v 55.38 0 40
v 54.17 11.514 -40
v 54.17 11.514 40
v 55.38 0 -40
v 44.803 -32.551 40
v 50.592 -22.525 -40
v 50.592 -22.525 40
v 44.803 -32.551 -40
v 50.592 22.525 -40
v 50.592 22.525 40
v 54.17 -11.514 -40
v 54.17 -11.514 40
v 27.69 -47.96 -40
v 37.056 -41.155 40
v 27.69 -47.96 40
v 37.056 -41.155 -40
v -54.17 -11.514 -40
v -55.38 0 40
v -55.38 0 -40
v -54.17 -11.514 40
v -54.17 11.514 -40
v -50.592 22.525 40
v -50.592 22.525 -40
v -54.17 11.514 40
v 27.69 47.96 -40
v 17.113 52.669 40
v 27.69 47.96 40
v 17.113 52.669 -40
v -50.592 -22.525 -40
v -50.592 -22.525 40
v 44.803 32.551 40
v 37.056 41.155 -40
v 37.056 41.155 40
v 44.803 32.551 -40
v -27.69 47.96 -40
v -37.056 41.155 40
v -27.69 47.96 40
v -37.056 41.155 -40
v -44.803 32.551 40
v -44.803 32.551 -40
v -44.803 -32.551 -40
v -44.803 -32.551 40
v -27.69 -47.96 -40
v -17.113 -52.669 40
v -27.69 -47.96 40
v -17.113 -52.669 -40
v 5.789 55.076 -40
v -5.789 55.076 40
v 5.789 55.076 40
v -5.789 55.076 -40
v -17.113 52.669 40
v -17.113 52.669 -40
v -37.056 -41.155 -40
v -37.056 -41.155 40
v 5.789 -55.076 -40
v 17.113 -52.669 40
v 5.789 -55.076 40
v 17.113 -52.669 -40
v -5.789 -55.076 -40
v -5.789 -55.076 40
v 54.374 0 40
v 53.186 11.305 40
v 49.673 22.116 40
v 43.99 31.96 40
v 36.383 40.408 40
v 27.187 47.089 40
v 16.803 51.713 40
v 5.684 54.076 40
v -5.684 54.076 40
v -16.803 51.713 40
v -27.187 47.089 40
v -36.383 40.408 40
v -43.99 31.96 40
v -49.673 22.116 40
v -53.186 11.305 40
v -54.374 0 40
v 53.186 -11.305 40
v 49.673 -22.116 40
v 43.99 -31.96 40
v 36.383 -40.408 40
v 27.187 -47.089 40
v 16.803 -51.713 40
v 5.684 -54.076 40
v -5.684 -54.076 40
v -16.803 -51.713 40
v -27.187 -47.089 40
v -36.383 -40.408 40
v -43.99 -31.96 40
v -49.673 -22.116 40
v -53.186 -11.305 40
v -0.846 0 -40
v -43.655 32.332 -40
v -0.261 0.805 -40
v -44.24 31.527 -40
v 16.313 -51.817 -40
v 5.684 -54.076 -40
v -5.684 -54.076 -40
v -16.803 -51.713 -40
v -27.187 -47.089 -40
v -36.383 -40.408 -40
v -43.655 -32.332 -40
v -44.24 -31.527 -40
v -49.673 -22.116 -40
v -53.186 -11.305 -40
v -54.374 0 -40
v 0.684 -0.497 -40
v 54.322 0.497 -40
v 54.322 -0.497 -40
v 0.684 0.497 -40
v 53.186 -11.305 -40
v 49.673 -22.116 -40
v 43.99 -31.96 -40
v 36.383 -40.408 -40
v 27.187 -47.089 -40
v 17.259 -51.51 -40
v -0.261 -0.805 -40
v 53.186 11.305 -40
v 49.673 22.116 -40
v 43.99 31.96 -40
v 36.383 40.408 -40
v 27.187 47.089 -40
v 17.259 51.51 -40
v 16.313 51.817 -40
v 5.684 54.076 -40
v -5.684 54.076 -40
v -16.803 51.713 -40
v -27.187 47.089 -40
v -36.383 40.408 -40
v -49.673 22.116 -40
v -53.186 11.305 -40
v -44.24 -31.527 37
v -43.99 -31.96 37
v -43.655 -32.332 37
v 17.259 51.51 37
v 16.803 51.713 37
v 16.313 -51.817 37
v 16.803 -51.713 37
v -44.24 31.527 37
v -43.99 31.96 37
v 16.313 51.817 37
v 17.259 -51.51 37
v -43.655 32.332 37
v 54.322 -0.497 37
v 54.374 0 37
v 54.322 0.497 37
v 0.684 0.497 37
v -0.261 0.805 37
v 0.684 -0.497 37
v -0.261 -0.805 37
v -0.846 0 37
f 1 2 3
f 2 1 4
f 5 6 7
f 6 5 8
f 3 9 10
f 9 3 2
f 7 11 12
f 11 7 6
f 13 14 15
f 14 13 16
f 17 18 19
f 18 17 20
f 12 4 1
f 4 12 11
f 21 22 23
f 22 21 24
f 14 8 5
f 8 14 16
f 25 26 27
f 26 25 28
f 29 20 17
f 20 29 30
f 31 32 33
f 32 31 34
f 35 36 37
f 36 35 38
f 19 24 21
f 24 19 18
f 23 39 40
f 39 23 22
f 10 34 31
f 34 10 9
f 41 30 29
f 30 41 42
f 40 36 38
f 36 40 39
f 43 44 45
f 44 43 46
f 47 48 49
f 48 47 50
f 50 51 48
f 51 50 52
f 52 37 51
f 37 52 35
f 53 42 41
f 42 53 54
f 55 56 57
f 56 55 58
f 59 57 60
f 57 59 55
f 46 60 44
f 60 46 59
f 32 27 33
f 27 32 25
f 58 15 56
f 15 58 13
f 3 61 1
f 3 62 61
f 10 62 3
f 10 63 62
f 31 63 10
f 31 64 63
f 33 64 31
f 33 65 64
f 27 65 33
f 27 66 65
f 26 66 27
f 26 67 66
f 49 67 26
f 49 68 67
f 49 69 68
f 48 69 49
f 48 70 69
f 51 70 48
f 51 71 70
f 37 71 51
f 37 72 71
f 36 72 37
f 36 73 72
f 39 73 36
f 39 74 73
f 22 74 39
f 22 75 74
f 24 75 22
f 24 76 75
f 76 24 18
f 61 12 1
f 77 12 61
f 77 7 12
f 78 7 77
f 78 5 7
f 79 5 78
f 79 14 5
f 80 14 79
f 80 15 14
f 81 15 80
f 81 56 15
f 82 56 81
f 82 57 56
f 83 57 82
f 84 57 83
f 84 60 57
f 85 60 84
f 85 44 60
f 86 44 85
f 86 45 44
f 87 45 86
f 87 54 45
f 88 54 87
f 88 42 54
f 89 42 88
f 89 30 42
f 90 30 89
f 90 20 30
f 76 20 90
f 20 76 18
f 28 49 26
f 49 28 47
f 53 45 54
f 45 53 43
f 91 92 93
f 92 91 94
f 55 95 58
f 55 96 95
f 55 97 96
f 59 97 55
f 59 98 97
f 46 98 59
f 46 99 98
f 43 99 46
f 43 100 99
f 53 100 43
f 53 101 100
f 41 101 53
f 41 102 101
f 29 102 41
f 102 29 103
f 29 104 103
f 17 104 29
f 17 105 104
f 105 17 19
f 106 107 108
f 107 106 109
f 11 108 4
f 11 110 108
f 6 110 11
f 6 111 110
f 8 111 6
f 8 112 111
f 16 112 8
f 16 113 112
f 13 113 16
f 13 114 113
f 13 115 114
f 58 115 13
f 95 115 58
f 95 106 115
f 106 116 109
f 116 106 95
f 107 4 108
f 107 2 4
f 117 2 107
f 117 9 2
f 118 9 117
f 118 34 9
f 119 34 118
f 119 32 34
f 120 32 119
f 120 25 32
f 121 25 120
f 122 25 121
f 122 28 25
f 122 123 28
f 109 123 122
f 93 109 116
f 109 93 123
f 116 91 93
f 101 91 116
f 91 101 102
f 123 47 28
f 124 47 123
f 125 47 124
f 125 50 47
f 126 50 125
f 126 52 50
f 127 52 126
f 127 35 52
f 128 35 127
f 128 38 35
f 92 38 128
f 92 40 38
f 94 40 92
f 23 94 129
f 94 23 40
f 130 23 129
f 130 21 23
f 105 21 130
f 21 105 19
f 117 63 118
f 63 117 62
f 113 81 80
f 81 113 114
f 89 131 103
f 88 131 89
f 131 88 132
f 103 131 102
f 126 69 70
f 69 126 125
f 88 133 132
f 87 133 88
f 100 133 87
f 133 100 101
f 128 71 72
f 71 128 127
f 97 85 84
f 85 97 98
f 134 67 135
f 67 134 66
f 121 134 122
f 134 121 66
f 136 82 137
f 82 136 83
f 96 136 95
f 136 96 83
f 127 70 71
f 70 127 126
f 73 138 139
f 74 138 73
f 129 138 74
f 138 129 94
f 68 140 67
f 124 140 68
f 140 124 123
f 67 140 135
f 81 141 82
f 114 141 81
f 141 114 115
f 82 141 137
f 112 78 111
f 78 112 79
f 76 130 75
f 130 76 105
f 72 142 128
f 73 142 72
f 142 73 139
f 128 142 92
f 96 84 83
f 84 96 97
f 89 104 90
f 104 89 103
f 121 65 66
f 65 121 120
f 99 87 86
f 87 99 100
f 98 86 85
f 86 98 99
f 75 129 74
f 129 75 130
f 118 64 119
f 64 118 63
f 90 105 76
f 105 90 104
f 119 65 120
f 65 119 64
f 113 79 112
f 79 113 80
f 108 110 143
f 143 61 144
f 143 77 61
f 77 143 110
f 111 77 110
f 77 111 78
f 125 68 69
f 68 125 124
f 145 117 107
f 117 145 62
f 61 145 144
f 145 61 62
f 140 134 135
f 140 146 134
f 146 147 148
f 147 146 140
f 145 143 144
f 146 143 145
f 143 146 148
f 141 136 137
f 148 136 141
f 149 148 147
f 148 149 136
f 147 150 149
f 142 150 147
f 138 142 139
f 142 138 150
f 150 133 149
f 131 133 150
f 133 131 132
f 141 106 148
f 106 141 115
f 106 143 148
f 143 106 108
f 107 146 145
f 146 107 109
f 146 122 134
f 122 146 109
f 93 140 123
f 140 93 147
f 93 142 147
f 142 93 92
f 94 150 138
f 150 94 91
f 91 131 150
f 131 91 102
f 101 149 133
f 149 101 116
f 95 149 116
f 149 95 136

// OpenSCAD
$fn=30;
 {
    h=80;
color((rndc()+[1,1,1])/2) 
 rotate(rndR()*0.0 )translate([0,0,-h/2])makecup(
h,
pip=rnd(.1,.9),
pipr=rnd(0.25,.0),
dia=70*5/3.16,
div=5,
wall=1);
}

module makecup(
h=50,
pip=.6,
pipr=.5,
dia=40,
div=5,
wall=1){

difference()
{

 connect(h,pip,pipr,dia,div,wall){
translate([0,0,h-wall])linear_extrude(wall)top( h,pip,pipr,dia,div,wall);
translate([0,0,h*(1-pip)-wall])linear_extrude(wall)bottom(h,pip,pipr,dia,div,wall);
linear_extrude(wall)bottom(h,pip,pipr,dia,div,wall);
 }
 
difference(){
 connect(h,pip,pipr,dia,div,wall){
translate([0,0,h-wall+0.01])linear_extrude(wall)offset(-wall)top(h,pip,pipr,dia,div,wall);
translate([0,0,h*(1-pip)-wall])linear_extrude(wall)offset(-wall)bottom(h,pip,pipr,dia,div,wall);
translate([0,0,-0.01]) linear_extrude(wall)offset(-wall)bottom(h,pip,pipr,dia,div,wall);
 }
  l=0.9;
linear_extrude(h-wall*3,convexity=100) {

 for (x=[0:360/(div
     ):360]){
rotate (x) hull()
 {
     
  circle(wall/2);
 
     translate([((dia/2)),0,0]) 
  circle(wall/2);
 }
  
 
 }}
}

} 
}
module connect(h,pip,pipr,dia,div,wall)
{
  hull(){
      children(0);
    children(1);
  }
  hull(){
    children(1);
    children(2);
  }
    }




module bottom(h,pip,pipr,dia,div,wall)
    {
        circle(dia/2);
        
        }

module top(h,pip,pipr,dia,div,wall){
    
 hull(){ 
    bottom(h,pip,pipr,dia,div,wall);
//    translate([((dia/2)*1.5)-((dia/2)*pipr),0,0])circle((dia/2)*pipr);
   }
    }

  
function rndc()=[rands(0,1,1)[0],rands(0,1,1)[0],rands(0,1,1)[0]];
  function rndR()=rands(-360,360,3) ;
function rnd(a = 1,b = 0,s = []) =
s == []?(rands(min(a,b),max(a,b),1)[0]) :(rands(min(a,b),max(a,b),1,s)[0]);
